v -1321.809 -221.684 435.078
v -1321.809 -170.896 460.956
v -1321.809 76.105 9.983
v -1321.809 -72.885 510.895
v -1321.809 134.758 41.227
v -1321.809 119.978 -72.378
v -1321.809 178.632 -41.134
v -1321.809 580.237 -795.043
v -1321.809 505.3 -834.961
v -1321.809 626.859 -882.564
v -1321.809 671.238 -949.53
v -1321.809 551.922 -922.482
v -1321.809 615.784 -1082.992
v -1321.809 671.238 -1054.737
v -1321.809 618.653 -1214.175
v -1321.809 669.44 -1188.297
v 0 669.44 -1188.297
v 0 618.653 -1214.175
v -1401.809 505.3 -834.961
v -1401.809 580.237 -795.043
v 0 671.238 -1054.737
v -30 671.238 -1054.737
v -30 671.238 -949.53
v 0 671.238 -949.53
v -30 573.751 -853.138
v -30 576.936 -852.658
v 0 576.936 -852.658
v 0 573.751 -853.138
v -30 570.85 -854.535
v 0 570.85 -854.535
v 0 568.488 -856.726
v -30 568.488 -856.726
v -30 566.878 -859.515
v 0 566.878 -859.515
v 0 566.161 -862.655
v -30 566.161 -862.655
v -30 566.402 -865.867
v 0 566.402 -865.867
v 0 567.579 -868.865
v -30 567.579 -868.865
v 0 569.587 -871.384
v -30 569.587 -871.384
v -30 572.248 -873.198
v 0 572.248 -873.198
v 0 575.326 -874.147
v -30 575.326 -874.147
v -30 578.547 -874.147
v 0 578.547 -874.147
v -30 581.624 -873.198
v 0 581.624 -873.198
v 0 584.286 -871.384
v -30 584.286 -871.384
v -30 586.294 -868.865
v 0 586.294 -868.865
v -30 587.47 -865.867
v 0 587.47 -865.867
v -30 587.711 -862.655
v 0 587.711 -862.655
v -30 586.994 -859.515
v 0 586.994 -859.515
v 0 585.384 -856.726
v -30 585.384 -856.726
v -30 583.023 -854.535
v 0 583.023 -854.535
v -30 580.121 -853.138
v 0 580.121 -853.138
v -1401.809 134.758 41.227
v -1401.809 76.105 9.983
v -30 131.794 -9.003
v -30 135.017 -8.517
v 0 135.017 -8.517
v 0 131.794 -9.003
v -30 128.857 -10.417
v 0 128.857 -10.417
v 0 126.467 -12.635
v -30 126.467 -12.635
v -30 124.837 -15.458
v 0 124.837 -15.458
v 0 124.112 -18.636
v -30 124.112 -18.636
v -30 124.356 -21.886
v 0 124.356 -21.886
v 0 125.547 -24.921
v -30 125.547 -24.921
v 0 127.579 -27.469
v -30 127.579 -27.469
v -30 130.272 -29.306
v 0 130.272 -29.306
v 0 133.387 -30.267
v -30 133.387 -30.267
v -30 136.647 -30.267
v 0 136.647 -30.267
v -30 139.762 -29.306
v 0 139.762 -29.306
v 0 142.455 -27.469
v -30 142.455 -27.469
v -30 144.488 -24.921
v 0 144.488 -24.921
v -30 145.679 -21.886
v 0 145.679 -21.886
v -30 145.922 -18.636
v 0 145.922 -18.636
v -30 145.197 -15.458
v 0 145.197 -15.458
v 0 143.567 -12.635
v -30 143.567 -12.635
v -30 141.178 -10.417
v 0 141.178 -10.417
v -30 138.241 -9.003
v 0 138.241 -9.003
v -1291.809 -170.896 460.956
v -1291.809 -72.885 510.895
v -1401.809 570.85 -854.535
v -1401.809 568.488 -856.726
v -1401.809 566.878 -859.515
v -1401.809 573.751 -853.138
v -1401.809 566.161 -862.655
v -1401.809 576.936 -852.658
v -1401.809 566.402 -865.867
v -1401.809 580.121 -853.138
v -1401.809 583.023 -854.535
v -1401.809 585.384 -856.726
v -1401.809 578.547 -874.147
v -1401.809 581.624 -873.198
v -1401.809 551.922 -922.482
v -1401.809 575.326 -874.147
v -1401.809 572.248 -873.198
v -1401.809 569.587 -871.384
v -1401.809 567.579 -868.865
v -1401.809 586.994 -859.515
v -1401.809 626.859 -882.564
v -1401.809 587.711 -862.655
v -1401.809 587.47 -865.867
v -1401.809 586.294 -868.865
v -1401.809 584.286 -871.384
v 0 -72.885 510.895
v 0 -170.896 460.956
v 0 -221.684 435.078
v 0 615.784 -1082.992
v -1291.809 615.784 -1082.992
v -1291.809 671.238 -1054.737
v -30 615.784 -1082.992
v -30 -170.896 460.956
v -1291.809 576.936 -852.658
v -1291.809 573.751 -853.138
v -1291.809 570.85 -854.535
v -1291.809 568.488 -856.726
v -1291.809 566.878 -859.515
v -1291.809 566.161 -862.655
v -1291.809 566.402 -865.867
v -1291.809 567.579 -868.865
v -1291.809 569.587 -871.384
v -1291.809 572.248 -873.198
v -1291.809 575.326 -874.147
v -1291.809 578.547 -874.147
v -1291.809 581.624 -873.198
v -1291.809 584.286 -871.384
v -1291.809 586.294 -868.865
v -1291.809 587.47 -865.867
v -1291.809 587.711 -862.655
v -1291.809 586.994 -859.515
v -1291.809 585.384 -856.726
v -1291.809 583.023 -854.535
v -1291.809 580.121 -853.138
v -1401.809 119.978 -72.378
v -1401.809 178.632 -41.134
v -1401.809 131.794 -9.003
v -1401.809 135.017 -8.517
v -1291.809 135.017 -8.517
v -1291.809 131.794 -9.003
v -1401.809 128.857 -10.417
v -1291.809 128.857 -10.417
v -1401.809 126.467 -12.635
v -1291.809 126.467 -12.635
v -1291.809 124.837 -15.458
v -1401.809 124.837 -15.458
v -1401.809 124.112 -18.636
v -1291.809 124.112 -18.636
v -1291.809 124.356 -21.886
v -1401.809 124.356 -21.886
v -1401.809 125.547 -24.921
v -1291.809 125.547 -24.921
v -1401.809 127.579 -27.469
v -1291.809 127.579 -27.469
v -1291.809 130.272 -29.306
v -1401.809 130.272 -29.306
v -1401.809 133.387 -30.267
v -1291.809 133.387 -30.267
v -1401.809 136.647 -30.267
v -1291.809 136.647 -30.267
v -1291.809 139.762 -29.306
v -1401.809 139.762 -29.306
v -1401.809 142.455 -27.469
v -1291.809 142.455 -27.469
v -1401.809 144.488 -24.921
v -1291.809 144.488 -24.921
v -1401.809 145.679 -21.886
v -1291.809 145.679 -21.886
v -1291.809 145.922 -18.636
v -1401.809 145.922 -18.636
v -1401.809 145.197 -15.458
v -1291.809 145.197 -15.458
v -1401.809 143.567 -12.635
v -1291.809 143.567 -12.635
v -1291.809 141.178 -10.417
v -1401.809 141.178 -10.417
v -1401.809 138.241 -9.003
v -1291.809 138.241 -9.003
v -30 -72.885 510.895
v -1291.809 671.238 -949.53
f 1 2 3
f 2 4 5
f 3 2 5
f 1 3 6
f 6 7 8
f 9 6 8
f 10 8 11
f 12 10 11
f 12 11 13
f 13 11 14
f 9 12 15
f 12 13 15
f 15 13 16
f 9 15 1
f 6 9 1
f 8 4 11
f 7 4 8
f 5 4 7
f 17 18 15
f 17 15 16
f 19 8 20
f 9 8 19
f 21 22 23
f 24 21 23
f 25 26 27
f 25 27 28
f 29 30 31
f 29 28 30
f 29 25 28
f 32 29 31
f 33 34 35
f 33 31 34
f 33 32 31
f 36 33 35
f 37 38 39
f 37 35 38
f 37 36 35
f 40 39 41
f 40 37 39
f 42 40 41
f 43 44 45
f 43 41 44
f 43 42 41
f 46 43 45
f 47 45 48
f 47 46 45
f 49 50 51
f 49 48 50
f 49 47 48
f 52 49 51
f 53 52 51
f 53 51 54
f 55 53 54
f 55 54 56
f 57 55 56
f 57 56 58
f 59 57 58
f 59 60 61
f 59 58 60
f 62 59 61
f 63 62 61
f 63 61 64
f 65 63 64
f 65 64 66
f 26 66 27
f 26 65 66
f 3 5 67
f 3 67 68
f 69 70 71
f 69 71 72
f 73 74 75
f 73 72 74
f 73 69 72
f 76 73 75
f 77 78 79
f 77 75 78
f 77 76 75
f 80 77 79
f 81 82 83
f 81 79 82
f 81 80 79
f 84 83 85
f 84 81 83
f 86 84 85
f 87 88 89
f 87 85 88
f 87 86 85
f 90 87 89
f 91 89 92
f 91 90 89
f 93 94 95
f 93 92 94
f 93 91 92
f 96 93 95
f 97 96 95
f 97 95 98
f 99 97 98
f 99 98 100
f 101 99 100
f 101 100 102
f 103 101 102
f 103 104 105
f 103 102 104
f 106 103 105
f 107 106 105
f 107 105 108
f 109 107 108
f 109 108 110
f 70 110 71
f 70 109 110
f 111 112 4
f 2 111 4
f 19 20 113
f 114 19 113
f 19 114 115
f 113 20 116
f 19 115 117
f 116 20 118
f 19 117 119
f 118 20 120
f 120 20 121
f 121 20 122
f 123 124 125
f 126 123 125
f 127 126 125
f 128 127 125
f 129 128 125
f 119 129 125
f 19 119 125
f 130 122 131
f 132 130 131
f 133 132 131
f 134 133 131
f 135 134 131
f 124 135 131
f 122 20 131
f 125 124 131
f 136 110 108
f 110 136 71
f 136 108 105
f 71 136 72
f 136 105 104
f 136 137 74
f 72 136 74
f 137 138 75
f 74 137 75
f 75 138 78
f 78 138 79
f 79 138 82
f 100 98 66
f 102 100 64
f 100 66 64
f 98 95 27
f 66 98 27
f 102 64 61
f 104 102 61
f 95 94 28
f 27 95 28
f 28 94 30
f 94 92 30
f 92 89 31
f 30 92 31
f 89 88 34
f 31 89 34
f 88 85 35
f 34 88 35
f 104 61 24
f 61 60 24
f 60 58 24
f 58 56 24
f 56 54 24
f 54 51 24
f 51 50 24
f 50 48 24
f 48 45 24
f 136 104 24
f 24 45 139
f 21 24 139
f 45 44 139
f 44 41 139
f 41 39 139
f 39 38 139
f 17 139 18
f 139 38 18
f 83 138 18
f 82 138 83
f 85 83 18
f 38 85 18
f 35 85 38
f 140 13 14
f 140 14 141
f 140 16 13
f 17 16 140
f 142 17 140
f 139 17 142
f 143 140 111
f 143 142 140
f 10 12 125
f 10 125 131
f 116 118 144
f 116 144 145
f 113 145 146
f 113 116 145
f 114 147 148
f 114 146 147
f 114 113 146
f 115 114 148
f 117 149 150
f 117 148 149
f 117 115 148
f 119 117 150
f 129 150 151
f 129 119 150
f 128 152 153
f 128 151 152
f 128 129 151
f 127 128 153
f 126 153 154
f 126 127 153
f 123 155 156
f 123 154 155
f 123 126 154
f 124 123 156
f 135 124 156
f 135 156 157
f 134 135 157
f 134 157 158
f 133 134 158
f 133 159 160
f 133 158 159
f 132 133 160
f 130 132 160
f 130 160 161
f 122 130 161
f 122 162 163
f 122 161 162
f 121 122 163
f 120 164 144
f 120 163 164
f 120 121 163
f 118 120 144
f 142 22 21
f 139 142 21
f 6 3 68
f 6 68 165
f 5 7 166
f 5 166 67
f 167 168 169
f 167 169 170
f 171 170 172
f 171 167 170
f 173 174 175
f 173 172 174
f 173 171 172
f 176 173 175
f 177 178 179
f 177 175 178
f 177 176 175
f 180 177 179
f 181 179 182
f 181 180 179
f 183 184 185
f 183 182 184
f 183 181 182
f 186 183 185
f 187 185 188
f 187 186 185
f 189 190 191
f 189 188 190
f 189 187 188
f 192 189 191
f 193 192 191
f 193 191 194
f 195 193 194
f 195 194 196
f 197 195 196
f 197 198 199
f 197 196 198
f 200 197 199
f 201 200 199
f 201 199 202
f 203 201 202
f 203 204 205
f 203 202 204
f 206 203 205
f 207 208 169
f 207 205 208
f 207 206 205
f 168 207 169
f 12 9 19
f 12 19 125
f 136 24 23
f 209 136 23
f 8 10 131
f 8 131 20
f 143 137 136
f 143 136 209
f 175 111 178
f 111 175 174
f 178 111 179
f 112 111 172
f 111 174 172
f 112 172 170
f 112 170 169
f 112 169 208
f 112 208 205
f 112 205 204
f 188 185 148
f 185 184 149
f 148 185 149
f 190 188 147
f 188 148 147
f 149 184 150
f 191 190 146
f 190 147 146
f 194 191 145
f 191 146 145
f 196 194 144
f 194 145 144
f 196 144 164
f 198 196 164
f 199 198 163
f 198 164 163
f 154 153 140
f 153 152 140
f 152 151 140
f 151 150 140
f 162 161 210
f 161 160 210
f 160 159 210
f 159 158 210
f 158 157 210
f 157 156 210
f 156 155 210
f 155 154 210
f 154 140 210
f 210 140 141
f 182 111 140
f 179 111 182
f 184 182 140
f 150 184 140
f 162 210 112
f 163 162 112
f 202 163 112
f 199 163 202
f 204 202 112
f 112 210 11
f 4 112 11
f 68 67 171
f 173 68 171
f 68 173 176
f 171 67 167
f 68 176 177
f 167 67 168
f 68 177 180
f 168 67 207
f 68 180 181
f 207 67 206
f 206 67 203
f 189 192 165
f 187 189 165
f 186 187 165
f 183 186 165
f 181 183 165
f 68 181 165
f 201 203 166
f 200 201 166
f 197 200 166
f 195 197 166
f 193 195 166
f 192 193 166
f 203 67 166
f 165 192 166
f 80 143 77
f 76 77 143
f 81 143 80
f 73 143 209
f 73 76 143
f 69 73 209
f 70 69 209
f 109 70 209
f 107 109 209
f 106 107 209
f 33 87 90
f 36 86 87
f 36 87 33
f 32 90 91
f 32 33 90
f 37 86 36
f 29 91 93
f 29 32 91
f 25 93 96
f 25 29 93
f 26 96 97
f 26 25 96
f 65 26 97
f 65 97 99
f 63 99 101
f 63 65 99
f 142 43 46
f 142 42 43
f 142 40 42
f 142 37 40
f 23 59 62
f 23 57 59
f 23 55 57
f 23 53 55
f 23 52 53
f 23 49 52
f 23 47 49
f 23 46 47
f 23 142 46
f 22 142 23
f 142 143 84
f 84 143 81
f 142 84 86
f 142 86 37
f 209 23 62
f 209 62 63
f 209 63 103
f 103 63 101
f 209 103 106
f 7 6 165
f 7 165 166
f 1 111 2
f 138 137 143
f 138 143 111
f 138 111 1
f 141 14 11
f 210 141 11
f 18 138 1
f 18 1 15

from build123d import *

# Parameters (mm, degrees)
BOSS_EXTRUDE1_DEPTH     = 1321.809345804
BOSS_EXTRUDE2_DEPTH     = 110
BOSS_EXTRUDE4_DEPTH     = 80
CUT_EXTRUDE1_DEPTH      = 390
CUT_EXTRUDE1_DEPTH_BACK = 1710
SKETCH4_R               = 10.935754795
SKETCH4_R_2             = 10.805085865
CUT_EXTRUDE2_DEPTH      = 10
CUT_EXTRUDE2_DEPTH_BACK = 1600
CUT_EXTRUDE3_DEPTH      = 1600
CUT_EXTRUDE3_DEPTH_BACK = 1800
SKETCH7_W               = 1261.809345804
SKETCH7_H               = 148.826585301


with BuildPart() as part:
    # Sketch1 → Boss-Extrude1 (new body)
    with BuildSketch(Plane(origin=(0, 0, 0), x_dir=(0, 0, -1), z_dir=(1, 0, 0))):
        Polygon((0, 0), (1214.174590511, 618.652853995), (1188.297132026, 669.440225874), (-25.877458485, 50.787371879), (-460.955944246, -170.896189144), (-435.078485761, -221.683561023), align=None)
    extrude(amount=-BOSS_EXTRUDE1_DEPTH)

    # Sketch2 → Boss-Extrude2 (add)
    with BuildSketch(Plane(origin=(0, 50.787371879, 25.877458485), x_dir=(1, 0, 0), z_dir=(0, 0.8910065241883673, 0.453990499739548))):
        Polygon((0, 0), (0, -488.3), (-67.842597561, -488.3), (-67.842597561, 0), (-67.842597561, 1244.513029496), (0, 1244.513029496), align=None)
        Polygon((-1321.809345804, 0), (-1321.809345804, 1244.513029496), (-1253.966748243, 1244.513029496), (-1253.966748243, 0), (-1253.966748243, -488.3), (-1321.809345804, -488.3), align=None)
    extrude(amount=BOSS_EXTRUDE2_DEPTH)

    # Sketch3 → Boss-Extrude4 (add)
    with BuildSketch(Plane.ZY.offset(1321.809345804)):
        Polygon((-882.563635412, 626.858827585), (-795.042959323, 580.236826077), (-834.961493519, 505.300165527), (-922.482169607, 551.922167035), align=None)
        Polygon((-41.133790816, 178.631674443), (41.227375134, 134.758128502), (9.982813434, 76.104594213), (-72.378352516, 119.978140155), align=None)
    extrude(amount=BOSS_EXTRUDE4_DEPTH)

    # Sketch4 → Cut-Extrude1 (cut, two sides: drawn at the far end of the back side and taken through both)
    with BuildSketch(Plane(origin=(0, 0, 0), x_dir=(0, 0, -1), z_dir=(1, 0, 0)).offset(-CUT_EXTRUDE1_DEPTH_BACK)):
        with Locations(Location((19.453016292, 135.017213441, 0), (0, 0, 180))):
            Circle(SKETCH4_R)
        with Locations(Location((863.462816879, 576.936245259, 0), (0, 0, 180))):
            Circle(SKETCH4_R_2)
    extrude(amount=CUT_EXTRUDE1_DEPTH + CUT_EXTRUDE1_DEPTH_BACK, mode=Mode.SUBTRACT)

    # Sketch5 → Cut-Extrude2 (cut, two sides: drawn at the far end of the back side and taken through both)
    with BuildSketch(Plane(origin=(0, 0, 0), x_dir=(0, 0, -1), z_dir=(1, 0, 0)).offset(-CUT_EXTRUDE2_DEPTH_BACK)):
        Polygon((1033.052815262, 713.795181733), (1054.736624804, 671.238309325), (949.530250393, 671.238309325), align=None)
    extrude(amount=CUT_EXTRUDE2_DEPTH + CUT_EXTRUDE2_DEPTH_BACK, mode=Mode.SUBTRACT)

    # Sketch7 → Cut-Extrude3 (cut, two sides: drawn at the far end of the back side and taken through both)
    with BuildSketch(Plane(origin=(0, -221.683561023, 435.078485761), x_dir=(1, 0, 0), z_dir=(0, -0.453990499739547, 0.8910065241883678)).offset(-CUT_EXTRUDE3_DEPTH_BACK)):
        with Locations((-660.904672902, 131.413292651)):
            Rectangle(SKETCH7_W, SKETCH7_H)
    extrude(amount=CUT_EXTRUDE3_DEPTH + CUT_EXTRUDE3_DEPTH_BACK, mode=Mode.SUBTRACT)


solid = part.part
